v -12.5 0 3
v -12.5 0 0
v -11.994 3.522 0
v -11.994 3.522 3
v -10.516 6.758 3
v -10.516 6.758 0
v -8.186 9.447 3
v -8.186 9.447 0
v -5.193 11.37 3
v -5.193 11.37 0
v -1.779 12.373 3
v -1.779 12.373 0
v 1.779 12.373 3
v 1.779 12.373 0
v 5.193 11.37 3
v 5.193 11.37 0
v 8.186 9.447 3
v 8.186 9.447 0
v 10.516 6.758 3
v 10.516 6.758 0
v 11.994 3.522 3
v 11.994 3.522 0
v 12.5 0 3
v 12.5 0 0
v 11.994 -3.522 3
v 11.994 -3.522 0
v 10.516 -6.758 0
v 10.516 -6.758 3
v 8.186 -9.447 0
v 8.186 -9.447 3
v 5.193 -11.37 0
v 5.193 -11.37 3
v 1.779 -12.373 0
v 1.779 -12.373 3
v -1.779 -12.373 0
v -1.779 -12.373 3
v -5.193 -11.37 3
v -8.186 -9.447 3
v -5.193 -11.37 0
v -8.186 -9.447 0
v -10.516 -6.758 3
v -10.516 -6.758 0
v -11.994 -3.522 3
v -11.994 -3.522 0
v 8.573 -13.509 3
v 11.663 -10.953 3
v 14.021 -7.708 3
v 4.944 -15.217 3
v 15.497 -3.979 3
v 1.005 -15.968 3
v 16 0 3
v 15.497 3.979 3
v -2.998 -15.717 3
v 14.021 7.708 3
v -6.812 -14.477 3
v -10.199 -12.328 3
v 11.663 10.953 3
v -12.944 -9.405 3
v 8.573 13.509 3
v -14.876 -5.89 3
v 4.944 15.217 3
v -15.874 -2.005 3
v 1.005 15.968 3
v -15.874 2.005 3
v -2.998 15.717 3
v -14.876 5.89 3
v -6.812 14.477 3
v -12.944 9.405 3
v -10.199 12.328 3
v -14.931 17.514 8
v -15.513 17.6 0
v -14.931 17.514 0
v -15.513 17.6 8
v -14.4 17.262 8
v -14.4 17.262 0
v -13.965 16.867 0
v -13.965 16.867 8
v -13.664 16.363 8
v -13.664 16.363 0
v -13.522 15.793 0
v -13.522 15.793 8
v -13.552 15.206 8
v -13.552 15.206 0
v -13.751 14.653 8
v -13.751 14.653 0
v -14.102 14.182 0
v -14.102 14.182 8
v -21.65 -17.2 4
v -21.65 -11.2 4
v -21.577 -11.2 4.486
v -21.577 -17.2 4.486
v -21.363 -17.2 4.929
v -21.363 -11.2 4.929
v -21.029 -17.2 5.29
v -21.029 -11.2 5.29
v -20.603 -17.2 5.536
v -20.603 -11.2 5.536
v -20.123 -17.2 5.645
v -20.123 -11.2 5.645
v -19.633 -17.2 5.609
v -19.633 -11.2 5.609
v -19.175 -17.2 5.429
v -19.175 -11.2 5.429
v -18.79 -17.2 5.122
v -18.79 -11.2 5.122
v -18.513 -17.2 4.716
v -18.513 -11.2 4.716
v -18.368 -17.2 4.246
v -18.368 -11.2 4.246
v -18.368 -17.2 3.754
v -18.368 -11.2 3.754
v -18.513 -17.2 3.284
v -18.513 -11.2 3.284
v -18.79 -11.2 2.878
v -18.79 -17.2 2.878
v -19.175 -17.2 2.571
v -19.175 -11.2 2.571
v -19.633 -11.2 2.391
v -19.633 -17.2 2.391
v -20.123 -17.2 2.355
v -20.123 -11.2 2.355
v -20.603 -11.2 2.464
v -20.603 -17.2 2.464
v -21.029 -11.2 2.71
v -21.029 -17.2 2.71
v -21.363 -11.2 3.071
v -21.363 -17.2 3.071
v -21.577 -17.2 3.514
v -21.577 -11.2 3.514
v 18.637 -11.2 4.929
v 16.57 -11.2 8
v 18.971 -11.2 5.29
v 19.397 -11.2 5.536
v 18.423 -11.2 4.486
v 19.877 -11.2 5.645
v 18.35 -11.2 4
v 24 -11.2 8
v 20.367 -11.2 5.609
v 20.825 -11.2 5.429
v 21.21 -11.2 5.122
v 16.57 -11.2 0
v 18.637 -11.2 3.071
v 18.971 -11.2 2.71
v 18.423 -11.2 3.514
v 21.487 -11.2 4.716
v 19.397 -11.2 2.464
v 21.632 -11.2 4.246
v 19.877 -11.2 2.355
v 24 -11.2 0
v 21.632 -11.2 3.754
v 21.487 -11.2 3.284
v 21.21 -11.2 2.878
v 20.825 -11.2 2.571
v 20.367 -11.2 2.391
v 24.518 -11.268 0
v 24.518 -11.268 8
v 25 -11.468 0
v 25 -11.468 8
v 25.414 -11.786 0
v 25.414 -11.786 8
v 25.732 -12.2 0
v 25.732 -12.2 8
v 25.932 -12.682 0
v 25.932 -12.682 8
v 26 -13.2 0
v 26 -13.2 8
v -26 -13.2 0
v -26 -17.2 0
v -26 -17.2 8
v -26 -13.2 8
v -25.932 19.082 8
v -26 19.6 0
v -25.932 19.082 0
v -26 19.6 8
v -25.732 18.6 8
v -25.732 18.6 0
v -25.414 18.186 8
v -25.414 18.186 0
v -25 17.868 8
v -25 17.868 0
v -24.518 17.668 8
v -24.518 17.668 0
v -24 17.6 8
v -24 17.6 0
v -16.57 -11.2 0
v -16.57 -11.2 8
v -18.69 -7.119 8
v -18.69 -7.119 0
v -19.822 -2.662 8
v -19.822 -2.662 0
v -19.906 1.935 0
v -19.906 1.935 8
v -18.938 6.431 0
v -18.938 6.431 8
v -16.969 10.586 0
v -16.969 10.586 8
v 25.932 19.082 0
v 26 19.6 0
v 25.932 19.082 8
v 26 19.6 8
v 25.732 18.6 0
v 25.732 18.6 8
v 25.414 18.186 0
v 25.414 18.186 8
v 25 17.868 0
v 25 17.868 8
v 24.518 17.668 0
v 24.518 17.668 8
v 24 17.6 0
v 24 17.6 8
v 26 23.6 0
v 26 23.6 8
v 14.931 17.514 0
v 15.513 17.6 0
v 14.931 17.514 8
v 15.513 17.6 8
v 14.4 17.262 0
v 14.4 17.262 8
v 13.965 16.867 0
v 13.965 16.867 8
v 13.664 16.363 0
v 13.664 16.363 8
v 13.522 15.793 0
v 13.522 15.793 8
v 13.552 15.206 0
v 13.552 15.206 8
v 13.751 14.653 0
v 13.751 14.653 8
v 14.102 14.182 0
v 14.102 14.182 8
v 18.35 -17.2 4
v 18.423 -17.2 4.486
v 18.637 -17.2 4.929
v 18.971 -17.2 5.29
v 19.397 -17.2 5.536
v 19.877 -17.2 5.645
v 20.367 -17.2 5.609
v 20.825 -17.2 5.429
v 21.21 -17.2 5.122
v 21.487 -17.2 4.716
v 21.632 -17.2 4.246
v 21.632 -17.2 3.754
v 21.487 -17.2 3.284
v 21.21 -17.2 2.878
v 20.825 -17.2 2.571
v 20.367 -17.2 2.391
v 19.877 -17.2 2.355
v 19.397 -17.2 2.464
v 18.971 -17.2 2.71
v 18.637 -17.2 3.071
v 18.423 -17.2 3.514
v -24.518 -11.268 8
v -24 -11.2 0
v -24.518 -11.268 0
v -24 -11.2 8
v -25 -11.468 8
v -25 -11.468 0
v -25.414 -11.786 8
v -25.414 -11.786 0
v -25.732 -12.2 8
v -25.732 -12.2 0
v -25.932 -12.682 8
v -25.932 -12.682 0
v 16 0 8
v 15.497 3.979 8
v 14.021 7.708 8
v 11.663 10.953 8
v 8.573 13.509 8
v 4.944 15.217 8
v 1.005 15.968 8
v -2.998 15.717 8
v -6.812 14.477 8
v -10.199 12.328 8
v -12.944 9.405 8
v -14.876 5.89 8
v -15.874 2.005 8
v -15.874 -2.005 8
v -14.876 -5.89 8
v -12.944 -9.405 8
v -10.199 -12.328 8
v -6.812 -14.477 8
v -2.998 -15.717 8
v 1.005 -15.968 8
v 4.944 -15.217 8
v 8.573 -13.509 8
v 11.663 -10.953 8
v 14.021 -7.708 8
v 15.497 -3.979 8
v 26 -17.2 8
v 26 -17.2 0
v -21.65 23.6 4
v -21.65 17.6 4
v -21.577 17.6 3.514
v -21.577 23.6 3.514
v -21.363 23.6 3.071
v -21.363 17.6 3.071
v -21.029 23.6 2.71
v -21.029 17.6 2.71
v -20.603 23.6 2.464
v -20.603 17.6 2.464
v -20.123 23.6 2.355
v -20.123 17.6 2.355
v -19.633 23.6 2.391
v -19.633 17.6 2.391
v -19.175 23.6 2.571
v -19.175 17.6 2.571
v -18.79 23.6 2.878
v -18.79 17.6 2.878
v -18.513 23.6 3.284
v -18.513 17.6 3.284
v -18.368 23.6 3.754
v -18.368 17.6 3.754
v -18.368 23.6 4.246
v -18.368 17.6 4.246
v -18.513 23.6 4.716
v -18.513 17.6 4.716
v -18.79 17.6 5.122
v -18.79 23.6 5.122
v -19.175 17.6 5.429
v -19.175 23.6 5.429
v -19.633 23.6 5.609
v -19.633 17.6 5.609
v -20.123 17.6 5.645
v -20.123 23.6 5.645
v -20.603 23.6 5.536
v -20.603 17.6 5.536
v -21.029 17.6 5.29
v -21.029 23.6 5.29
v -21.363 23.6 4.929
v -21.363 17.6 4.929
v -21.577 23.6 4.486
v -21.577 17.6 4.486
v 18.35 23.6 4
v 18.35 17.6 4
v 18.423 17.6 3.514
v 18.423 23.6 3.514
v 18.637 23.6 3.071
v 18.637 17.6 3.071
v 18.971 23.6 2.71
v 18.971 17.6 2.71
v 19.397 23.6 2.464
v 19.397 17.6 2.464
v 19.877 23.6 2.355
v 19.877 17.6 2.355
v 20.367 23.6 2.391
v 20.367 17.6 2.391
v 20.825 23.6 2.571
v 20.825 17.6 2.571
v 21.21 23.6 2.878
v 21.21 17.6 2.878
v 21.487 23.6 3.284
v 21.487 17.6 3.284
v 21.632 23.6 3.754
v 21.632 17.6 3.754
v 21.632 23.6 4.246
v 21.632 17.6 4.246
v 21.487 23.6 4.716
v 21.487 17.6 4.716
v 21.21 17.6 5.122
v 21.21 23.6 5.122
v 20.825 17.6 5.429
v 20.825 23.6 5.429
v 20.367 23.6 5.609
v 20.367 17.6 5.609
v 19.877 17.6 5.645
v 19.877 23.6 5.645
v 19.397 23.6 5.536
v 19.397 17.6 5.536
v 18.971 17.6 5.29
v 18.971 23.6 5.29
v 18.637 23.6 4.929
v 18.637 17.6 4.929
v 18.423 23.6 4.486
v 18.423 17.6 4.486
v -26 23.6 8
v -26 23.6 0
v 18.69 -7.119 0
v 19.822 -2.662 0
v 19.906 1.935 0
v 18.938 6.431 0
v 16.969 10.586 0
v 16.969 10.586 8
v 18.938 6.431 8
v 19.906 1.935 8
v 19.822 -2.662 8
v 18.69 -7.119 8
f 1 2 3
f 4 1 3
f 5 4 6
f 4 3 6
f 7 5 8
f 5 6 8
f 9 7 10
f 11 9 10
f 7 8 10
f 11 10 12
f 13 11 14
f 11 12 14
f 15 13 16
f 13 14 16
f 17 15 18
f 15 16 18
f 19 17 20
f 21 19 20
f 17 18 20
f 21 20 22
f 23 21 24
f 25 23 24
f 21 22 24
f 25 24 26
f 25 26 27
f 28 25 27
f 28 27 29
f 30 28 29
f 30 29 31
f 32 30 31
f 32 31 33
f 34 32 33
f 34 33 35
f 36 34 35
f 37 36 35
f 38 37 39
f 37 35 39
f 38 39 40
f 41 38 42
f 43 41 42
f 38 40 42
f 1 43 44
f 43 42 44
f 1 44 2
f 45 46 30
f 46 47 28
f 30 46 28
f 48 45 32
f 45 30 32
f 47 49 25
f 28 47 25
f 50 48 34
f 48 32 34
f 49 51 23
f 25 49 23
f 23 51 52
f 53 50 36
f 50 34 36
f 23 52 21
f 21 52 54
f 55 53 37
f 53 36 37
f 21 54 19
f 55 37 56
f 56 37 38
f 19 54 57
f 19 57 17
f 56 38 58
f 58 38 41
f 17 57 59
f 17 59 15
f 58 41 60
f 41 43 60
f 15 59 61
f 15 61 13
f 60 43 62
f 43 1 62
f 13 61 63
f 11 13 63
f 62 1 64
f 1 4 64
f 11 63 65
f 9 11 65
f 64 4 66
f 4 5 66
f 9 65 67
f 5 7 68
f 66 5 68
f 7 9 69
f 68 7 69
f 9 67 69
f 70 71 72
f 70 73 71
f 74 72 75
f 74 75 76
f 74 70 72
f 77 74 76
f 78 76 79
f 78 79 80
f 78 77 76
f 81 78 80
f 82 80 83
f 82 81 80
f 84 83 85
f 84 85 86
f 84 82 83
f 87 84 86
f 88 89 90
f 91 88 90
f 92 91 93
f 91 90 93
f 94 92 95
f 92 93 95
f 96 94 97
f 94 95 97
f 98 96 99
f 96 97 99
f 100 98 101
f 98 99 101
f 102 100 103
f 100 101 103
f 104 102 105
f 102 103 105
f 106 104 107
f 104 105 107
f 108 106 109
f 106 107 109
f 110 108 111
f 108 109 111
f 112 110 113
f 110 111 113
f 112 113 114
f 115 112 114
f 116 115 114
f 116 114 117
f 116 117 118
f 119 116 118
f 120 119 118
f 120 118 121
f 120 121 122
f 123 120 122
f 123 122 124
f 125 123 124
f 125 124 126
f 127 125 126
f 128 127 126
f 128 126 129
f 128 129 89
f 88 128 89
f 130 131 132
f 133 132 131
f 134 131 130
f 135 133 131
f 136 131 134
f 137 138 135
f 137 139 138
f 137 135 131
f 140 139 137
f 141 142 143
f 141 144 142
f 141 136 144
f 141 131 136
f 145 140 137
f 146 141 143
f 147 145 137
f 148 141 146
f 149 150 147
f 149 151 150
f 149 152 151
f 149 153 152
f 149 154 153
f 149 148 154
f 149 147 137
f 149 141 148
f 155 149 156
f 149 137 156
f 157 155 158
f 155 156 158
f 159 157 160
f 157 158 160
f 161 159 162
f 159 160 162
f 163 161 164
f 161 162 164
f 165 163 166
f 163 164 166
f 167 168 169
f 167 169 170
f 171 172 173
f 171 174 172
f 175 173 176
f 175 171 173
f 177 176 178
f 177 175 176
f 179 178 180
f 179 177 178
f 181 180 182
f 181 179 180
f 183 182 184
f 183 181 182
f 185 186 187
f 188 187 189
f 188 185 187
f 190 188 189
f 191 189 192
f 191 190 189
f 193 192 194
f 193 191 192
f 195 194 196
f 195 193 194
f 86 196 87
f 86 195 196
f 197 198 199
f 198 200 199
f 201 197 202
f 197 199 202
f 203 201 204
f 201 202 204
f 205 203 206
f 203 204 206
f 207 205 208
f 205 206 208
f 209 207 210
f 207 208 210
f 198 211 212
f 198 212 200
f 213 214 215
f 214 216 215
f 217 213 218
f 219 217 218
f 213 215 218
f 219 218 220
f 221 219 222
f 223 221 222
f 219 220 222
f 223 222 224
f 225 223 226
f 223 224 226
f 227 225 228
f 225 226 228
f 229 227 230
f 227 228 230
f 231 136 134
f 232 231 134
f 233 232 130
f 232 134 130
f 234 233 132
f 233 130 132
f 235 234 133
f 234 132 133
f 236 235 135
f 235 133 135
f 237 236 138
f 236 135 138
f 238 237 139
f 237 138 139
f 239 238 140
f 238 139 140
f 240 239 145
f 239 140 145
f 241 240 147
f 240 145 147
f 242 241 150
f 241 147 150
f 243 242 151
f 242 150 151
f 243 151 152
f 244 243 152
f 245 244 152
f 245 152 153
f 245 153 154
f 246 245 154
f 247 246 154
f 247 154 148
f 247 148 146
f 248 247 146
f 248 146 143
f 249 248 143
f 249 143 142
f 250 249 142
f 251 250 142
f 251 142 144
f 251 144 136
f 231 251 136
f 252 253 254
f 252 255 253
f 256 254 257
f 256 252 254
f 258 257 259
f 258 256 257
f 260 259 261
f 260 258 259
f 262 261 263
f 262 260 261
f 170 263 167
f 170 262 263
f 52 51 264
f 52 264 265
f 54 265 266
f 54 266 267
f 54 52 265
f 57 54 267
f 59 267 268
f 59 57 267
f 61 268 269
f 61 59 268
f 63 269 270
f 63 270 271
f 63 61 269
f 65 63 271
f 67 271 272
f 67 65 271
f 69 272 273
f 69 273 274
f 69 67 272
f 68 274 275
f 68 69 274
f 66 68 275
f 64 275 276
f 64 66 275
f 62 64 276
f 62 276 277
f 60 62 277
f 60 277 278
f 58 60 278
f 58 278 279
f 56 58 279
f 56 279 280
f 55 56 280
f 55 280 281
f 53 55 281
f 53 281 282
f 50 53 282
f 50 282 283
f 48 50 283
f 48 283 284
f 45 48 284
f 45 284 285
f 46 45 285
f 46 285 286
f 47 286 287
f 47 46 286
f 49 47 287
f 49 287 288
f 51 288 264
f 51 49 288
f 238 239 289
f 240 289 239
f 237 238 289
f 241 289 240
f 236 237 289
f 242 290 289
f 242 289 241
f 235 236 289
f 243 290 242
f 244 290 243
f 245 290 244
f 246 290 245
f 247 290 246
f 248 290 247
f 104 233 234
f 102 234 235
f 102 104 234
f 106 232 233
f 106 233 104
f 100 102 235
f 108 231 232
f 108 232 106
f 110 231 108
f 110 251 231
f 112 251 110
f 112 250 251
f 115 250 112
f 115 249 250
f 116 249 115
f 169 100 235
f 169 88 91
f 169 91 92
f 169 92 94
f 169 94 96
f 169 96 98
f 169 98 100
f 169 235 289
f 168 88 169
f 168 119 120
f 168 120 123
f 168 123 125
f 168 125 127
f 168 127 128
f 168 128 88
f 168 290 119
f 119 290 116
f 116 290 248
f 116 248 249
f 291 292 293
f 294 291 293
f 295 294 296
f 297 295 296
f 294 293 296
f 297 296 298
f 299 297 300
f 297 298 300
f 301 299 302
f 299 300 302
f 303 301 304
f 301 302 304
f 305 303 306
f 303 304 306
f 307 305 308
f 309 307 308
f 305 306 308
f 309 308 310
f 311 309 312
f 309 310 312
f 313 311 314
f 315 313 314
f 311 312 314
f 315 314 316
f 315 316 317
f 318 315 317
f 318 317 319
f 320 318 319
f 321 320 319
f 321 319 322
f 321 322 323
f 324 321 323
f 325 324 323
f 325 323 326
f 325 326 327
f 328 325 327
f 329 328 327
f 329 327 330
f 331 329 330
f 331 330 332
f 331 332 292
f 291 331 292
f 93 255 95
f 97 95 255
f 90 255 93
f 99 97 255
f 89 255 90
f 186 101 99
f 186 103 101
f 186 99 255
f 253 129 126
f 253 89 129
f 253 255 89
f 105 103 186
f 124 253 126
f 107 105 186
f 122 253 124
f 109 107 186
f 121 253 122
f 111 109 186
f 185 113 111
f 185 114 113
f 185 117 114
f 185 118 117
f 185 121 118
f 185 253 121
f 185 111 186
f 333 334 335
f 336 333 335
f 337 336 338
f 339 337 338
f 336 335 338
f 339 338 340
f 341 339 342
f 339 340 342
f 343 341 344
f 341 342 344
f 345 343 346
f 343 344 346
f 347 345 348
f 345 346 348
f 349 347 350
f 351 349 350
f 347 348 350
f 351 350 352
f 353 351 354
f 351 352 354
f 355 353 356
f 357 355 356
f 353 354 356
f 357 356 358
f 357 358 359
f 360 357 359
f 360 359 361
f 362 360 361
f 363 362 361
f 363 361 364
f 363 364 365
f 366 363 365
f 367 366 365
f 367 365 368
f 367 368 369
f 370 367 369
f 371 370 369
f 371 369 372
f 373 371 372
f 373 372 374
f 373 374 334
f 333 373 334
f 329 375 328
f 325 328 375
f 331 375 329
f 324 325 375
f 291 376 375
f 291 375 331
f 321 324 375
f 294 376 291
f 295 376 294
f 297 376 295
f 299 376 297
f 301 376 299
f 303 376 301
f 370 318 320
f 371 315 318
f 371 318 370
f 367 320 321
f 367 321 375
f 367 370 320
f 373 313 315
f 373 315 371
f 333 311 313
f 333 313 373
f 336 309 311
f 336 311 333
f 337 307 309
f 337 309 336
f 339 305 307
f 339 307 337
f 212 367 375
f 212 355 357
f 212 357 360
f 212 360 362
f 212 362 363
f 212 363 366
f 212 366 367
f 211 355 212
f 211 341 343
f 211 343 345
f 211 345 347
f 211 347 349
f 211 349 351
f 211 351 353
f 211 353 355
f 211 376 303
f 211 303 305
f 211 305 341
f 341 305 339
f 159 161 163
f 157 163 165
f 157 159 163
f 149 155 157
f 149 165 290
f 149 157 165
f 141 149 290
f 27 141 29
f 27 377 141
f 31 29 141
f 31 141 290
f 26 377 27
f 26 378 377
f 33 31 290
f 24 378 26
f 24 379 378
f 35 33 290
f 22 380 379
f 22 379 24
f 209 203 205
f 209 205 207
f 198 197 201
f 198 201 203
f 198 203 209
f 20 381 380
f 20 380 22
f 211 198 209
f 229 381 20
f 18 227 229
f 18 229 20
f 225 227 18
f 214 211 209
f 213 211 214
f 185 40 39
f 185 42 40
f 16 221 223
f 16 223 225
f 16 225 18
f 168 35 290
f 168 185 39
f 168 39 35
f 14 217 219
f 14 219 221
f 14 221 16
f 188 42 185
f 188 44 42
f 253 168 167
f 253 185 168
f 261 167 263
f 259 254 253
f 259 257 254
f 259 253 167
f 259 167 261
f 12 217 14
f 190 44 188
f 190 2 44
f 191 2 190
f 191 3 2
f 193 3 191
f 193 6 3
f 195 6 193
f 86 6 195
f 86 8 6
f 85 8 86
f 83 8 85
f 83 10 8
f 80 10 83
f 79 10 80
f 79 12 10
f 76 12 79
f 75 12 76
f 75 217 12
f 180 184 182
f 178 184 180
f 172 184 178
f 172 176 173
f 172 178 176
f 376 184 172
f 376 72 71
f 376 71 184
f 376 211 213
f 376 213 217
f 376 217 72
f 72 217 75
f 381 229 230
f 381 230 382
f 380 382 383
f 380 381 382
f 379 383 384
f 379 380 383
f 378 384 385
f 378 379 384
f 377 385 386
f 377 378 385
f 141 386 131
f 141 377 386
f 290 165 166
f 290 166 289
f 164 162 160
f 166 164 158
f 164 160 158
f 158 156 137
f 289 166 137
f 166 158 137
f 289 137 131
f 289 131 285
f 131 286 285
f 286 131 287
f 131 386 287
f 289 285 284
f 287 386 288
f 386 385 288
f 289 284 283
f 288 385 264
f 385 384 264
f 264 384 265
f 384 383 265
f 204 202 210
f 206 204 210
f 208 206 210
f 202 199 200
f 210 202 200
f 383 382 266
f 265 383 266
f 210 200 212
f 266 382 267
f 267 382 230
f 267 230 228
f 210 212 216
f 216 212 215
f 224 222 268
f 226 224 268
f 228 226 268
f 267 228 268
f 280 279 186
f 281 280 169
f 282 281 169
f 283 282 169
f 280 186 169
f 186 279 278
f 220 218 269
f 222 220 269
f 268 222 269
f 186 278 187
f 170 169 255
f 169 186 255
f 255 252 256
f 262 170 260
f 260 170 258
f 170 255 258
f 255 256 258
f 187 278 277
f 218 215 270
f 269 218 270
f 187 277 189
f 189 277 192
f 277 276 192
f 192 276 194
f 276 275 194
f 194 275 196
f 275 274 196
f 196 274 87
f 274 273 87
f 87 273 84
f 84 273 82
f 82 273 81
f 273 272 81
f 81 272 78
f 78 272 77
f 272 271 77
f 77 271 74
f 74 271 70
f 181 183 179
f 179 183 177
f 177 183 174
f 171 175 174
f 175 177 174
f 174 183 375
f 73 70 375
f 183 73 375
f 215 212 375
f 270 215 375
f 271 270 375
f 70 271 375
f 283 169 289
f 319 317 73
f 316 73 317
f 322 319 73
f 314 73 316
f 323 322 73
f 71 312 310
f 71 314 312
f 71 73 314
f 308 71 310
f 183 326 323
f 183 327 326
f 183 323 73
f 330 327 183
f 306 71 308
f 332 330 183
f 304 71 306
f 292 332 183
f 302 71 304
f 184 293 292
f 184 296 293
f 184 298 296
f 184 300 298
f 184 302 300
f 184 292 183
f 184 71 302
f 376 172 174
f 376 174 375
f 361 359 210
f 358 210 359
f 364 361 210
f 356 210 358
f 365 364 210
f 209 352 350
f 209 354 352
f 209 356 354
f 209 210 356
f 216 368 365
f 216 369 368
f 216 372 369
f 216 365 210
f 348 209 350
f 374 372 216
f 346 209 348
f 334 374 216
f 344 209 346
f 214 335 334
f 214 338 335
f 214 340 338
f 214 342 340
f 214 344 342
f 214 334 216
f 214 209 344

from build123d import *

# Parameters (mm, degrees)
SKETCH_1_R             = 16
EXTRUDE_1_DEPTH        = 8
FILLET_1_R             = 2
SKETCH_4_R             = 16
SKETCH_4_R_2           = 12.5
EXTRUDE_2_DEPTH        = 3
HOLE_WIZARD_M4_3_D     = 3.3
HOLE_WIZARD_M4_3_DEPTH = 6
HOLE_WIZARD_M4_4_D     = 3.3
HOLE_WIZARD_M4_4_DEPTH = 6


with BuildPart() as part:
    # 草图1 → 凸台-拉伸1 (new body)
    with BuildSketch(Plane.XY):
        with BuildLine():
            Line((-26, 23.6), (26, 23.6))
            Line((26, 23.6), (26, 17.6))
            Line((26, 17.6), (9.49947367, 17.6))
            ThreePointArc((9.49947367, 17.6), (19.423244762, 4.76839207), (16.569852142, -11.2))
            Line((16.569852142, -11.2), (26, -11.2))
            Line((26, -11.2), (26, -17.2))
            Line((26, -17.2), (-26, -17.2))
            Line((-26, -17.2), (-26, -11.2))
            Line((-26, -11.2), (-16.569852142, -11.2))
            ThreePointArc((-16.569852142, -11.2), (-19.423244762, 4.76839207), (-9.49947367, 17.6))
            Line((-9.49947367, 17.6), (-26, 17.6))
            Line((-26, 17.6), (-26, 23.6))
        make_face()
        Circle(SKETCH_1_R, mode=Mode.SUBTRACT)
    extrude(amount=EXTRUDE_1_DEPTH)

    # 圆角1
    fillet_1_edges = [part.edges().sort_by_distance(p)[0] for p in [
        (-26, -11.2, 4),
        (-9.49947367, 17.6, 4),
        (-26, 17.6, 4),
        (26, 17.6, 4),
        (9.49947367, 17.6, 4),
        (26, -11.2, 4),
    ]]
    fillet(fillet_1_edges, radius=FILLET_1_R)

    # 草图4 → 凸台-拉伸2 (add)
    with BuildSketch(Plane(origin=(0, 0, 0), x_dir=(-1, 0, 0), z_dir=(0, 0, -1))):
        Circle(SKETCH_4_R)
        Circle(SKETCH_4_R_2, mode=Mode.SUBTRACT)
    extrude(amount=-EXTRUDE_2_DEPTH)

    # M4 螺纹孔3
    with Locations(Plane(origin=(0, 23.6, 0), x_dir=(1, 0, 0), z_dir=(0, 1, 0))):
        with Locations((20, -4), (-20, -4)):
            Hole(HOLE_WIZARD_M4_3_D / 2, depth=HOLE_WIZARD_M4_3_DEPTH)

    # M4 螺纹孔4
    with Locations(Plane.XZ.offset(17.2)):
        with Locations((20, 4), (-20, 4)):
            Hole(HOLE_WIZARD_M4_4_D / 2, depth=HOLE_WIZARD_M4_4_DEPTH)


solid = part.part
